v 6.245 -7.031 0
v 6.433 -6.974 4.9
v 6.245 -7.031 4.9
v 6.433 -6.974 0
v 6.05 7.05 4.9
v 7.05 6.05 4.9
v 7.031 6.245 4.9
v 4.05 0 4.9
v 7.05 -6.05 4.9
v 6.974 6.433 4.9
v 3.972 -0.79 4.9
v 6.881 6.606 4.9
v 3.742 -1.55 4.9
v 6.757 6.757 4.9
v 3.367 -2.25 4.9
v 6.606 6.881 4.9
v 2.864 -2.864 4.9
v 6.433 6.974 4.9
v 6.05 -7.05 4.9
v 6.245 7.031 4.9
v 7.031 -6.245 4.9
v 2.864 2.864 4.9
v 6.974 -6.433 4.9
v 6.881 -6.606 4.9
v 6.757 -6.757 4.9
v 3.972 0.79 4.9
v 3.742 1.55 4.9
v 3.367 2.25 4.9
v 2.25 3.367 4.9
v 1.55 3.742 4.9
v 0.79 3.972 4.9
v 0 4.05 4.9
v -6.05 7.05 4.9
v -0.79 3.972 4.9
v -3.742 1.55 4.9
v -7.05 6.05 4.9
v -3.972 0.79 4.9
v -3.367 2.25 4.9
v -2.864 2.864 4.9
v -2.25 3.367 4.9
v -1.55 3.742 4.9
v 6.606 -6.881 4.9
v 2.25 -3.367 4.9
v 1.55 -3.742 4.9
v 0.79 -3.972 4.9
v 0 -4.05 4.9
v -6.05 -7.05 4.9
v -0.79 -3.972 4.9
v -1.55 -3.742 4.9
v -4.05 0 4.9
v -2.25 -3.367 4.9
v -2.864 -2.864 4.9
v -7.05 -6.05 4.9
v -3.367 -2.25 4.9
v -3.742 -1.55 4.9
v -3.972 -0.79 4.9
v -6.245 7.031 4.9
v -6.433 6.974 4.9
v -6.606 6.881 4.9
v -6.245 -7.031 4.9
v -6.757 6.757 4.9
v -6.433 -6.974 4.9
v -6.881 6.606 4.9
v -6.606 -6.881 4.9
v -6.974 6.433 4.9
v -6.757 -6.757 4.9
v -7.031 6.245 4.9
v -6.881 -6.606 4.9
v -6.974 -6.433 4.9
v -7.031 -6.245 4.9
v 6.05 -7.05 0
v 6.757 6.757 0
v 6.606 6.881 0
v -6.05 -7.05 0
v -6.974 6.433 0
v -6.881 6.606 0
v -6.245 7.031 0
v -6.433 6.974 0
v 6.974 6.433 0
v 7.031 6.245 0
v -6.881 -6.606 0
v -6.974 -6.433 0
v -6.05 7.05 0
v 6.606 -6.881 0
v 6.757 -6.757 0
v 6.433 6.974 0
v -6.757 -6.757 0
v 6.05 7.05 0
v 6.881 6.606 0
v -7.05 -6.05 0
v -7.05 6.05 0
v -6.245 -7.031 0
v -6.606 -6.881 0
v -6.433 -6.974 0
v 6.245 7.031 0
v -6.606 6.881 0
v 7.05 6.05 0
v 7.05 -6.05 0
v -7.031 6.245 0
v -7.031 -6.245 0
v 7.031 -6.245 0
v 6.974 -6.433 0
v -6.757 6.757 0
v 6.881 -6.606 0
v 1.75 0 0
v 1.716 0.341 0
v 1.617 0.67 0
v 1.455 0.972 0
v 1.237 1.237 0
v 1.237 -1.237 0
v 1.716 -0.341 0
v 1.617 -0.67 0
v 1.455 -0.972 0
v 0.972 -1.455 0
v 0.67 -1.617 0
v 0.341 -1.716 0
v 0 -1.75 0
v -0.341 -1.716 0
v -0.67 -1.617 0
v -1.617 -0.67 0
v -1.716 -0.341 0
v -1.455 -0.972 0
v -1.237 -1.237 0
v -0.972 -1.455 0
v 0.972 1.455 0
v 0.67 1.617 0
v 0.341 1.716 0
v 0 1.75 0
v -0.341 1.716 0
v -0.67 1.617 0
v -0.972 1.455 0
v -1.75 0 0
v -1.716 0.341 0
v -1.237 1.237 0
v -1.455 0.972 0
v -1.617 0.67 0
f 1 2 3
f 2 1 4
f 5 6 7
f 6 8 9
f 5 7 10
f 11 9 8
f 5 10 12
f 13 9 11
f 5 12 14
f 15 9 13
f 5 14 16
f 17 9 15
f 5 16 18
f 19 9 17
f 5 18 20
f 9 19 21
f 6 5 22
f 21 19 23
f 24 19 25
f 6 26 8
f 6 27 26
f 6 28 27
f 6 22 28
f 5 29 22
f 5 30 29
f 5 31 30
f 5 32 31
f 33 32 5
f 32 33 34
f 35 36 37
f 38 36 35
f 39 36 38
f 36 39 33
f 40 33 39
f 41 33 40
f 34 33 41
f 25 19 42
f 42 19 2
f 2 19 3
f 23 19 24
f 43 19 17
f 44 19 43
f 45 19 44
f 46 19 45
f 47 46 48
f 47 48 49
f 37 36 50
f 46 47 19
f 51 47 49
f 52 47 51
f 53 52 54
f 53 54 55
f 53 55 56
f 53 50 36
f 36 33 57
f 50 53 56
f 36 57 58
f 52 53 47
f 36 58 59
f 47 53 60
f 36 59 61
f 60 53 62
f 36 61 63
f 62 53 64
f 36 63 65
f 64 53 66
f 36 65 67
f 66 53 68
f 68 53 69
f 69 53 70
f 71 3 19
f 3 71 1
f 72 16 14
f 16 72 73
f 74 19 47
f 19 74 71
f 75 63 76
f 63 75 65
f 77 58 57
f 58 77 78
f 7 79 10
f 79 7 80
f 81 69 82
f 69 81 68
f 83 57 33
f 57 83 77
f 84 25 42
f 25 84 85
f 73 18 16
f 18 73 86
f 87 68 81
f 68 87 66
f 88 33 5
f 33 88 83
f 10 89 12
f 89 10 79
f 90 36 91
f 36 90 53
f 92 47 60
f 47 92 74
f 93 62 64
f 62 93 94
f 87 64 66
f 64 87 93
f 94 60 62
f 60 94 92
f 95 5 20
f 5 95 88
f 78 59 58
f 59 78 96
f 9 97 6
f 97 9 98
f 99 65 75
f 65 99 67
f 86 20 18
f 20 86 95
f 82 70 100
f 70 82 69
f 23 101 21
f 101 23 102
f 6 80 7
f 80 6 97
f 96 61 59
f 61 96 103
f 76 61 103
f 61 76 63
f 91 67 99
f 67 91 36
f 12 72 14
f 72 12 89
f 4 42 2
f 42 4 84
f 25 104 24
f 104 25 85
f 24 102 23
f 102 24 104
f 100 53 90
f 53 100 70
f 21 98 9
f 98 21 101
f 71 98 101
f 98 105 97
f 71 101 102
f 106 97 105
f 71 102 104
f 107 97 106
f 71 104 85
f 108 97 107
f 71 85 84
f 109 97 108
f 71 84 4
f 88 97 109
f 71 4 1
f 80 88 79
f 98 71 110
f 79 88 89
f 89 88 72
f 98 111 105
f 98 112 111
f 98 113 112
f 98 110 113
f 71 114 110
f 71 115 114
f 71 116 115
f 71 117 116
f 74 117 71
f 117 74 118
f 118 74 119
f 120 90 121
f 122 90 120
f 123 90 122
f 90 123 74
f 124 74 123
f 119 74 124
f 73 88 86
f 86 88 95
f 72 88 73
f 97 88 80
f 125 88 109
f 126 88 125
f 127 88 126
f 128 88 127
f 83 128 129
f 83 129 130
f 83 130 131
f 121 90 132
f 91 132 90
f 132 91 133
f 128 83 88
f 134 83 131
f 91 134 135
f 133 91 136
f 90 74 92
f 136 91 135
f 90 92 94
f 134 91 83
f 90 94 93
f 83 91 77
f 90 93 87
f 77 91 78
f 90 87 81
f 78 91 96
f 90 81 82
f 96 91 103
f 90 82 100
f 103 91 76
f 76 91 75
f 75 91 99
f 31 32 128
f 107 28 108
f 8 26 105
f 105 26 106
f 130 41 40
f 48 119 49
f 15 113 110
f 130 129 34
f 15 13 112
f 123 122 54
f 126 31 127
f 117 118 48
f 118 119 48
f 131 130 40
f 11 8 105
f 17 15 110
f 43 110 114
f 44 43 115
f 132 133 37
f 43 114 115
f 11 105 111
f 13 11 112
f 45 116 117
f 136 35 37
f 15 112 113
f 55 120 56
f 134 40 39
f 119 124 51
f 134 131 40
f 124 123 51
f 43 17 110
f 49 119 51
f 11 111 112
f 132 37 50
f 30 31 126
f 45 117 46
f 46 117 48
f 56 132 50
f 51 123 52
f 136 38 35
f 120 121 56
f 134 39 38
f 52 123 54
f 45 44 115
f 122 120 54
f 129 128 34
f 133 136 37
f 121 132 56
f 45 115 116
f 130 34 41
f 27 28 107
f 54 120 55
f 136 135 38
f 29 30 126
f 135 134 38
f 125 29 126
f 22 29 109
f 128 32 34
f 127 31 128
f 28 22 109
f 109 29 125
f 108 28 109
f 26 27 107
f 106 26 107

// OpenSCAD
// Screen door latch spacer
// For example screen door

$fn = 32;

hole_dist = 45.4;
hole_dia = 4.6;
spacer_thick = 8.7;
latch_len = 57.3+0.4;
latch_wid = 12.7+0.4;
latch_base_thick = 2.0;
spacer_border_thick = 2.5;

module latchRect() {
    square([latch_len, latch_wid], center=true);
}
//latchRect();

module spacer2D() {
    offset(spacer_border_thick)
    latchRect();
}
//spacer2D();

module spacerHoles2D() {
    translate([hole_dist/2,0])
    circle(d=hole_dia);
    translate([-hole_dist/2,0])
    circle(d=hole_dia);
}
//#spacerHoles2D();

module cutSpacer2D() {
    difference() {
        spacer2D();
        spacerHoles2D();
    }
}
//cutSpacer2D();

module spacer() {
    difference() {
        linear_extrude(spacer_thick+latch_base_thick)
        cutSpacer2D();
        translate([0,0,spacer_thick])
        linear_extrude(latch_base_thick)
        latchRect();
    }
}
//spacer();


shaft_dia = 3.5;
head_dia = 8.3-0.2;
head_len = 3.9+1.0;
module tpuScrewSpacer() {
    difference() {
        linear_extrude(head_len)
        offset(1.0)
        square(latch_wid-1.0, center=true);
        
        cylinder(d1=shaft_dia, d2=head_dia, h=head_len);
    }
}
tpuScrewSpacer();
